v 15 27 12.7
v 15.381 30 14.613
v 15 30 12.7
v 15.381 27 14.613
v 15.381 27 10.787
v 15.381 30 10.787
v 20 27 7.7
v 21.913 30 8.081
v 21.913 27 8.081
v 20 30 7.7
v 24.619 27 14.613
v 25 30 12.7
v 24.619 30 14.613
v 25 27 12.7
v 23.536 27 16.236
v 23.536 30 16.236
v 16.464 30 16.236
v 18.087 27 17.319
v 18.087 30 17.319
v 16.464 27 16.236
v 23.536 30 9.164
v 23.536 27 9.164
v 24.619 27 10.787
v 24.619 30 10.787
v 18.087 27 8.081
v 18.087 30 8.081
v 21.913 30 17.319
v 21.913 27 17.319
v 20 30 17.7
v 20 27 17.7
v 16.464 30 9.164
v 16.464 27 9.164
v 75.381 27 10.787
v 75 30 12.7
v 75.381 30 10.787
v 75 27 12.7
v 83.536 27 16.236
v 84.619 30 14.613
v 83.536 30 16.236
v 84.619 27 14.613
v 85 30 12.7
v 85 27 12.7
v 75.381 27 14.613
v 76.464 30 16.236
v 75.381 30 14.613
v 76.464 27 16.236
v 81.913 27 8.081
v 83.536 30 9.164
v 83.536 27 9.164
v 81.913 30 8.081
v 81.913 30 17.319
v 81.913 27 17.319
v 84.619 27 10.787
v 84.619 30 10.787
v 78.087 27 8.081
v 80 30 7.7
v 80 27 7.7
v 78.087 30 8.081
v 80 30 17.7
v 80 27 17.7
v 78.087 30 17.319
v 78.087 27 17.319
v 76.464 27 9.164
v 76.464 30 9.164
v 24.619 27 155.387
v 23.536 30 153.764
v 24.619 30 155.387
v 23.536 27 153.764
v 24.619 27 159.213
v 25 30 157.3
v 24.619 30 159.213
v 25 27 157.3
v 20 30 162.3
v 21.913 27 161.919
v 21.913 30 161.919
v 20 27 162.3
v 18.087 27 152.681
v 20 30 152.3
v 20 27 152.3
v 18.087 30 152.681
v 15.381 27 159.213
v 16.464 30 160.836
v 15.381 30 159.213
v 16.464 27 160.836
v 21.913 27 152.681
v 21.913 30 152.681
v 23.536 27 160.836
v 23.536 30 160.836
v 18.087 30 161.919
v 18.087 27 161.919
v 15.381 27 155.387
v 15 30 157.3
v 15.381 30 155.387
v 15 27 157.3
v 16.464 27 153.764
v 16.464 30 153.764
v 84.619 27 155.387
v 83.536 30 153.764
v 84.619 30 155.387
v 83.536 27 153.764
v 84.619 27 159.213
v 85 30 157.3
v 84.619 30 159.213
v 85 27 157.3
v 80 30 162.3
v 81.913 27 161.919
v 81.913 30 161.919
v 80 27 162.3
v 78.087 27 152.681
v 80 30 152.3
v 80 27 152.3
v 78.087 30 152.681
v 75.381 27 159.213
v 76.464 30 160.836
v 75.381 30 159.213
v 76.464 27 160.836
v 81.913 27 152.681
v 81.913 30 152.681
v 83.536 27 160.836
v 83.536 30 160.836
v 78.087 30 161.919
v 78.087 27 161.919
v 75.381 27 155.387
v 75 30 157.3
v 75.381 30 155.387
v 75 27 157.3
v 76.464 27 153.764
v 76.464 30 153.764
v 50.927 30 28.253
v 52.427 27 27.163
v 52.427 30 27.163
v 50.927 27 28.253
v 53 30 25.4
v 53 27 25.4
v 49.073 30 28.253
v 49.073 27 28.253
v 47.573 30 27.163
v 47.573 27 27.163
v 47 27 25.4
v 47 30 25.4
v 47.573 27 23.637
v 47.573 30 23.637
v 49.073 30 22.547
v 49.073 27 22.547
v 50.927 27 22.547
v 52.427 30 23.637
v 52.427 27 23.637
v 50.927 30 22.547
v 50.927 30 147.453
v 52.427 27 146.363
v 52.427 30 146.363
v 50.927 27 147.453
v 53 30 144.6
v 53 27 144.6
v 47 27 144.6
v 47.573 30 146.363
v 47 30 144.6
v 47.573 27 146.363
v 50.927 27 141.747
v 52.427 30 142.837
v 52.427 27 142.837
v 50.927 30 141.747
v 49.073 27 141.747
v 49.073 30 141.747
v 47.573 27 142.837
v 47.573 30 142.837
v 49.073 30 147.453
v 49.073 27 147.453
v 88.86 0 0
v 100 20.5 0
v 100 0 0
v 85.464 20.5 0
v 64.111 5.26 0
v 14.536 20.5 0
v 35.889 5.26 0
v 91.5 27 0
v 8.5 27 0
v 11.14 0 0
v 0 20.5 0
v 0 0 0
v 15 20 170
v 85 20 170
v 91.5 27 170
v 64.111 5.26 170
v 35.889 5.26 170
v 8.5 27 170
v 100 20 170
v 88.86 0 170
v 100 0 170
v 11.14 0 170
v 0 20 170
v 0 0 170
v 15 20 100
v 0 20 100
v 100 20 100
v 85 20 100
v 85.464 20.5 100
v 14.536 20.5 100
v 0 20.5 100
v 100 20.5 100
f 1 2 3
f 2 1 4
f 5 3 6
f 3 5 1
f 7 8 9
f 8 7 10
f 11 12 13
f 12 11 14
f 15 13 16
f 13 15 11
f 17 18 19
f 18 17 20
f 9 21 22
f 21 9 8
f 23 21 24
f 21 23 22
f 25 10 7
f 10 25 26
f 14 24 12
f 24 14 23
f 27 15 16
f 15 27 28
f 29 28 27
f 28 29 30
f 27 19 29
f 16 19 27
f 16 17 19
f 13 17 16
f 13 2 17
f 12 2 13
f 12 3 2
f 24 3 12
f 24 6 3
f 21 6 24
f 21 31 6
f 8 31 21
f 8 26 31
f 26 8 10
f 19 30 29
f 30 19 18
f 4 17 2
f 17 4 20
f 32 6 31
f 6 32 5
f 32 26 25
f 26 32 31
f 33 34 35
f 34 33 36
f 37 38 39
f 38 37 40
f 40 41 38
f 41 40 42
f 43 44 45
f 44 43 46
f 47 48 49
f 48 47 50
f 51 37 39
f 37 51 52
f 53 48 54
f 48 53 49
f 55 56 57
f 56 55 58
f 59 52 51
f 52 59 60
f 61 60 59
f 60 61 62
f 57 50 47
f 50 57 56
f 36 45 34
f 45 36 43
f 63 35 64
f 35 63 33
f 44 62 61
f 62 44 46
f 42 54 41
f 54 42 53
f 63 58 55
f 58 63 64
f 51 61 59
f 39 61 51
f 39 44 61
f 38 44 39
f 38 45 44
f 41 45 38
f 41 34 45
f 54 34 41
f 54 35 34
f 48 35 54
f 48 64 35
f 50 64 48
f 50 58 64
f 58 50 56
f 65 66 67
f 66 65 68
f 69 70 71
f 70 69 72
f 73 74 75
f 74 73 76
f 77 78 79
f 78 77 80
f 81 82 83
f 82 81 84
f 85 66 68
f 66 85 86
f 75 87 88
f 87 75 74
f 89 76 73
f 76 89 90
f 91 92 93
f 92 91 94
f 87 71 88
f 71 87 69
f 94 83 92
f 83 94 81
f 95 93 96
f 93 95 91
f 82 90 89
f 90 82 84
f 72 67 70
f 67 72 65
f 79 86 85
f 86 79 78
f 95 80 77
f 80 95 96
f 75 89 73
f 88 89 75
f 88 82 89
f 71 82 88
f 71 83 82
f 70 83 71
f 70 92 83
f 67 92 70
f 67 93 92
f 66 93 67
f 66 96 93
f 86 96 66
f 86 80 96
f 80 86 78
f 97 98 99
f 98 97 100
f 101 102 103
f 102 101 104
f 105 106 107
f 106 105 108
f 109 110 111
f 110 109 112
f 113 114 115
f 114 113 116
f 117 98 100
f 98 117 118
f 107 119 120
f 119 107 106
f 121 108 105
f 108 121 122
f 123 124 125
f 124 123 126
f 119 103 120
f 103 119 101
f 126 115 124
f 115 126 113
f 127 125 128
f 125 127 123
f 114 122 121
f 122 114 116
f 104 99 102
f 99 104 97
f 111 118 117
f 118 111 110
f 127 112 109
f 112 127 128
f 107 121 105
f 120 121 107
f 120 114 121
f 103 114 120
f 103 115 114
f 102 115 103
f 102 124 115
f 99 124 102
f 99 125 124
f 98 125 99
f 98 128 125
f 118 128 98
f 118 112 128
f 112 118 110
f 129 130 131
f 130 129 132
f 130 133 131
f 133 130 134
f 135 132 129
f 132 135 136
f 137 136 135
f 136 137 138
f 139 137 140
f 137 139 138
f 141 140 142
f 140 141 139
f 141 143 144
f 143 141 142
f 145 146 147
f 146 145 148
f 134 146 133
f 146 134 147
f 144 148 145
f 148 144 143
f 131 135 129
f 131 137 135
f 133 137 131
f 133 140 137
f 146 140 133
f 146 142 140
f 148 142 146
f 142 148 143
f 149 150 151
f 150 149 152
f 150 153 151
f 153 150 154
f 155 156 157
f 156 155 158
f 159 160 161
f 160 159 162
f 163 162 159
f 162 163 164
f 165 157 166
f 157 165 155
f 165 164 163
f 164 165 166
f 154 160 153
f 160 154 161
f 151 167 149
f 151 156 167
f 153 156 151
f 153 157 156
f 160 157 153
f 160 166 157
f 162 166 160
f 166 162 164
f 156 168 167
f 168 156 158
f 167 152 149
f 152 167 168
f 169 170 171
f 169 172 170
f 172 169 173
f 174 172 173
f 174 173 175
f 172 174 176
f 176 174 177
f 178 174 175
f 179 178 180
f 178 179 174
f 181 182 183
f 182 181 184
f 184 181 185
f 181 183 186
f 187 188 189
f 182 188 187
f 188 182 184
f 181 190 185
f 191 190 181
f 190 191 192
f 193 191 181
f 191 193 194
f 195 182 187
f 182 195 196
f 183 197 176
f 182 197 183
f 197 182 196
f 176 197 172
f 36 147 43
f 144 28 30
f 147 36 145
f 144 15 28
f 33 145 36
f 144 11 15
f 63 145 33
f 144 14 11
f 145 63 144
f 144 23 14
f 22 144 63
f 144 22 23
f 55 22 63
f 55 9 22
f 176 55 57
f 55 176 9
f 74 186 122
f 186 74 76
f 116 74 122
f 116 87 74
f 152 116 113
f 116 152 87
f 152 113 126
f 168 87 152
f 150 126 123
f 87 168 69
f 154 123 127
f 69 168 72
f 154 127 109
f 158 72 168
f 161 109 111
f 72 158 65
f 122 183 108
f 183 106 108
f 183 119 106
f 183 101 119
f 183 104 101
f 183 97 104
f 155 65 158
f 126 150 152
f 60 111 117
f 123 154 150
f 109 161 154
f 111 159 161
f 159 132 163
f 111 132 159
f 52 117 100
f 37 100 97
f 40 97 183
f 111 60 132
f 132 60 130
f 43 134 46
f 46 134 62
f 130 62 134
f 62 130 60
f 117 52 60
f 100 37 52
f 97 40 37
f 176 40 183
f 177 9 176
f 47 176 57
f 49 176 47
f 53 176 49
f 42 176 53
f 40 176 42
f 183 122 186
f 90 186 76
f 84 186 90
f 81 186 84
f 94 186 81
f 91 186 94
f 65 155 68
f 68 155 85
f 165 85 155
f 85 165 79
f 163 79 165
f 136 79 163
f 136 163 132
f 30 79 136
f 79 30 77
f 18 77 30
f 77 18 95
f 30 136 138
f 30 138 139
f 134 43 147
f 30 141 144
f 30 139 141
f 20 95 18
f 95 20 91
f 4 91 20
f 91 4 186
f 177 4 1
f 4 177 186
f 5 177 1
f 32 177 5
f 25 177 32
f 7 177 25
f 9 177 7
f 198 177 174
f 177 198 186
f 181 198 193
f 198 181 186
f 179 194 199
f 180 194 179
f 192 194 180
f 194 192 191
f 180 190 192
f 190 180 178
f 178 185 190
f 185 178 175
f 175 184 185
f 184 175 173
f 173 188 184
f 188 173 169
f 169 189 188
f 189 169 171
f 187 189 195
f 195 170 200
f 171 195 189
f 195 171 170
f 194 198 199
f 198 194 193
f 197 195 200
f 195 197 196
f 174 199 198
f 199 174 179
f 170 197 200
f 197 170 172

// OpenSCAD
celestron_losmandy_style_dovetail_bar(100);
//鸠尾板
module celestron_losmandy_style_dovetail_bar(main_tube_lenght){

color("black")
translate([0,20,0]){
for(i=[[20,0,12.7],[80,0,12.7],
   [20,0,main_tube_lenght+70-12.7],[80,0,main_tube_lenght+70-12.7] 
])    
translate(i)    
    rotate([90,0,0])
    cylinder(h=20,d=10,center=true);

translate([50,0,25.4])    
    rotate([90,0,0])
    cylinder(h=20,d=6,center=true);

translate([50,0,main_tube_lenght-25.4+70])    
    rotate([90,0,0])
    cylinder(h=20,d=6,center=true);
}
    
    //鸠尾板
color("DarkOrange")
linear_extrude(height=main_tube_lenght+70){

    difference(){
 polygon(points=[[0,0],[100,0],[100,20],[85,20],[91.5,27],[8.5,27],[15,20],[0,20]
 ]);
 
 translate([50,-135+6])
 circle(r=135);}}
 
 translate([0,20,0])
 color("SandyBrown")
 cube([100,0.5,main_tube_lenght]);
    }
